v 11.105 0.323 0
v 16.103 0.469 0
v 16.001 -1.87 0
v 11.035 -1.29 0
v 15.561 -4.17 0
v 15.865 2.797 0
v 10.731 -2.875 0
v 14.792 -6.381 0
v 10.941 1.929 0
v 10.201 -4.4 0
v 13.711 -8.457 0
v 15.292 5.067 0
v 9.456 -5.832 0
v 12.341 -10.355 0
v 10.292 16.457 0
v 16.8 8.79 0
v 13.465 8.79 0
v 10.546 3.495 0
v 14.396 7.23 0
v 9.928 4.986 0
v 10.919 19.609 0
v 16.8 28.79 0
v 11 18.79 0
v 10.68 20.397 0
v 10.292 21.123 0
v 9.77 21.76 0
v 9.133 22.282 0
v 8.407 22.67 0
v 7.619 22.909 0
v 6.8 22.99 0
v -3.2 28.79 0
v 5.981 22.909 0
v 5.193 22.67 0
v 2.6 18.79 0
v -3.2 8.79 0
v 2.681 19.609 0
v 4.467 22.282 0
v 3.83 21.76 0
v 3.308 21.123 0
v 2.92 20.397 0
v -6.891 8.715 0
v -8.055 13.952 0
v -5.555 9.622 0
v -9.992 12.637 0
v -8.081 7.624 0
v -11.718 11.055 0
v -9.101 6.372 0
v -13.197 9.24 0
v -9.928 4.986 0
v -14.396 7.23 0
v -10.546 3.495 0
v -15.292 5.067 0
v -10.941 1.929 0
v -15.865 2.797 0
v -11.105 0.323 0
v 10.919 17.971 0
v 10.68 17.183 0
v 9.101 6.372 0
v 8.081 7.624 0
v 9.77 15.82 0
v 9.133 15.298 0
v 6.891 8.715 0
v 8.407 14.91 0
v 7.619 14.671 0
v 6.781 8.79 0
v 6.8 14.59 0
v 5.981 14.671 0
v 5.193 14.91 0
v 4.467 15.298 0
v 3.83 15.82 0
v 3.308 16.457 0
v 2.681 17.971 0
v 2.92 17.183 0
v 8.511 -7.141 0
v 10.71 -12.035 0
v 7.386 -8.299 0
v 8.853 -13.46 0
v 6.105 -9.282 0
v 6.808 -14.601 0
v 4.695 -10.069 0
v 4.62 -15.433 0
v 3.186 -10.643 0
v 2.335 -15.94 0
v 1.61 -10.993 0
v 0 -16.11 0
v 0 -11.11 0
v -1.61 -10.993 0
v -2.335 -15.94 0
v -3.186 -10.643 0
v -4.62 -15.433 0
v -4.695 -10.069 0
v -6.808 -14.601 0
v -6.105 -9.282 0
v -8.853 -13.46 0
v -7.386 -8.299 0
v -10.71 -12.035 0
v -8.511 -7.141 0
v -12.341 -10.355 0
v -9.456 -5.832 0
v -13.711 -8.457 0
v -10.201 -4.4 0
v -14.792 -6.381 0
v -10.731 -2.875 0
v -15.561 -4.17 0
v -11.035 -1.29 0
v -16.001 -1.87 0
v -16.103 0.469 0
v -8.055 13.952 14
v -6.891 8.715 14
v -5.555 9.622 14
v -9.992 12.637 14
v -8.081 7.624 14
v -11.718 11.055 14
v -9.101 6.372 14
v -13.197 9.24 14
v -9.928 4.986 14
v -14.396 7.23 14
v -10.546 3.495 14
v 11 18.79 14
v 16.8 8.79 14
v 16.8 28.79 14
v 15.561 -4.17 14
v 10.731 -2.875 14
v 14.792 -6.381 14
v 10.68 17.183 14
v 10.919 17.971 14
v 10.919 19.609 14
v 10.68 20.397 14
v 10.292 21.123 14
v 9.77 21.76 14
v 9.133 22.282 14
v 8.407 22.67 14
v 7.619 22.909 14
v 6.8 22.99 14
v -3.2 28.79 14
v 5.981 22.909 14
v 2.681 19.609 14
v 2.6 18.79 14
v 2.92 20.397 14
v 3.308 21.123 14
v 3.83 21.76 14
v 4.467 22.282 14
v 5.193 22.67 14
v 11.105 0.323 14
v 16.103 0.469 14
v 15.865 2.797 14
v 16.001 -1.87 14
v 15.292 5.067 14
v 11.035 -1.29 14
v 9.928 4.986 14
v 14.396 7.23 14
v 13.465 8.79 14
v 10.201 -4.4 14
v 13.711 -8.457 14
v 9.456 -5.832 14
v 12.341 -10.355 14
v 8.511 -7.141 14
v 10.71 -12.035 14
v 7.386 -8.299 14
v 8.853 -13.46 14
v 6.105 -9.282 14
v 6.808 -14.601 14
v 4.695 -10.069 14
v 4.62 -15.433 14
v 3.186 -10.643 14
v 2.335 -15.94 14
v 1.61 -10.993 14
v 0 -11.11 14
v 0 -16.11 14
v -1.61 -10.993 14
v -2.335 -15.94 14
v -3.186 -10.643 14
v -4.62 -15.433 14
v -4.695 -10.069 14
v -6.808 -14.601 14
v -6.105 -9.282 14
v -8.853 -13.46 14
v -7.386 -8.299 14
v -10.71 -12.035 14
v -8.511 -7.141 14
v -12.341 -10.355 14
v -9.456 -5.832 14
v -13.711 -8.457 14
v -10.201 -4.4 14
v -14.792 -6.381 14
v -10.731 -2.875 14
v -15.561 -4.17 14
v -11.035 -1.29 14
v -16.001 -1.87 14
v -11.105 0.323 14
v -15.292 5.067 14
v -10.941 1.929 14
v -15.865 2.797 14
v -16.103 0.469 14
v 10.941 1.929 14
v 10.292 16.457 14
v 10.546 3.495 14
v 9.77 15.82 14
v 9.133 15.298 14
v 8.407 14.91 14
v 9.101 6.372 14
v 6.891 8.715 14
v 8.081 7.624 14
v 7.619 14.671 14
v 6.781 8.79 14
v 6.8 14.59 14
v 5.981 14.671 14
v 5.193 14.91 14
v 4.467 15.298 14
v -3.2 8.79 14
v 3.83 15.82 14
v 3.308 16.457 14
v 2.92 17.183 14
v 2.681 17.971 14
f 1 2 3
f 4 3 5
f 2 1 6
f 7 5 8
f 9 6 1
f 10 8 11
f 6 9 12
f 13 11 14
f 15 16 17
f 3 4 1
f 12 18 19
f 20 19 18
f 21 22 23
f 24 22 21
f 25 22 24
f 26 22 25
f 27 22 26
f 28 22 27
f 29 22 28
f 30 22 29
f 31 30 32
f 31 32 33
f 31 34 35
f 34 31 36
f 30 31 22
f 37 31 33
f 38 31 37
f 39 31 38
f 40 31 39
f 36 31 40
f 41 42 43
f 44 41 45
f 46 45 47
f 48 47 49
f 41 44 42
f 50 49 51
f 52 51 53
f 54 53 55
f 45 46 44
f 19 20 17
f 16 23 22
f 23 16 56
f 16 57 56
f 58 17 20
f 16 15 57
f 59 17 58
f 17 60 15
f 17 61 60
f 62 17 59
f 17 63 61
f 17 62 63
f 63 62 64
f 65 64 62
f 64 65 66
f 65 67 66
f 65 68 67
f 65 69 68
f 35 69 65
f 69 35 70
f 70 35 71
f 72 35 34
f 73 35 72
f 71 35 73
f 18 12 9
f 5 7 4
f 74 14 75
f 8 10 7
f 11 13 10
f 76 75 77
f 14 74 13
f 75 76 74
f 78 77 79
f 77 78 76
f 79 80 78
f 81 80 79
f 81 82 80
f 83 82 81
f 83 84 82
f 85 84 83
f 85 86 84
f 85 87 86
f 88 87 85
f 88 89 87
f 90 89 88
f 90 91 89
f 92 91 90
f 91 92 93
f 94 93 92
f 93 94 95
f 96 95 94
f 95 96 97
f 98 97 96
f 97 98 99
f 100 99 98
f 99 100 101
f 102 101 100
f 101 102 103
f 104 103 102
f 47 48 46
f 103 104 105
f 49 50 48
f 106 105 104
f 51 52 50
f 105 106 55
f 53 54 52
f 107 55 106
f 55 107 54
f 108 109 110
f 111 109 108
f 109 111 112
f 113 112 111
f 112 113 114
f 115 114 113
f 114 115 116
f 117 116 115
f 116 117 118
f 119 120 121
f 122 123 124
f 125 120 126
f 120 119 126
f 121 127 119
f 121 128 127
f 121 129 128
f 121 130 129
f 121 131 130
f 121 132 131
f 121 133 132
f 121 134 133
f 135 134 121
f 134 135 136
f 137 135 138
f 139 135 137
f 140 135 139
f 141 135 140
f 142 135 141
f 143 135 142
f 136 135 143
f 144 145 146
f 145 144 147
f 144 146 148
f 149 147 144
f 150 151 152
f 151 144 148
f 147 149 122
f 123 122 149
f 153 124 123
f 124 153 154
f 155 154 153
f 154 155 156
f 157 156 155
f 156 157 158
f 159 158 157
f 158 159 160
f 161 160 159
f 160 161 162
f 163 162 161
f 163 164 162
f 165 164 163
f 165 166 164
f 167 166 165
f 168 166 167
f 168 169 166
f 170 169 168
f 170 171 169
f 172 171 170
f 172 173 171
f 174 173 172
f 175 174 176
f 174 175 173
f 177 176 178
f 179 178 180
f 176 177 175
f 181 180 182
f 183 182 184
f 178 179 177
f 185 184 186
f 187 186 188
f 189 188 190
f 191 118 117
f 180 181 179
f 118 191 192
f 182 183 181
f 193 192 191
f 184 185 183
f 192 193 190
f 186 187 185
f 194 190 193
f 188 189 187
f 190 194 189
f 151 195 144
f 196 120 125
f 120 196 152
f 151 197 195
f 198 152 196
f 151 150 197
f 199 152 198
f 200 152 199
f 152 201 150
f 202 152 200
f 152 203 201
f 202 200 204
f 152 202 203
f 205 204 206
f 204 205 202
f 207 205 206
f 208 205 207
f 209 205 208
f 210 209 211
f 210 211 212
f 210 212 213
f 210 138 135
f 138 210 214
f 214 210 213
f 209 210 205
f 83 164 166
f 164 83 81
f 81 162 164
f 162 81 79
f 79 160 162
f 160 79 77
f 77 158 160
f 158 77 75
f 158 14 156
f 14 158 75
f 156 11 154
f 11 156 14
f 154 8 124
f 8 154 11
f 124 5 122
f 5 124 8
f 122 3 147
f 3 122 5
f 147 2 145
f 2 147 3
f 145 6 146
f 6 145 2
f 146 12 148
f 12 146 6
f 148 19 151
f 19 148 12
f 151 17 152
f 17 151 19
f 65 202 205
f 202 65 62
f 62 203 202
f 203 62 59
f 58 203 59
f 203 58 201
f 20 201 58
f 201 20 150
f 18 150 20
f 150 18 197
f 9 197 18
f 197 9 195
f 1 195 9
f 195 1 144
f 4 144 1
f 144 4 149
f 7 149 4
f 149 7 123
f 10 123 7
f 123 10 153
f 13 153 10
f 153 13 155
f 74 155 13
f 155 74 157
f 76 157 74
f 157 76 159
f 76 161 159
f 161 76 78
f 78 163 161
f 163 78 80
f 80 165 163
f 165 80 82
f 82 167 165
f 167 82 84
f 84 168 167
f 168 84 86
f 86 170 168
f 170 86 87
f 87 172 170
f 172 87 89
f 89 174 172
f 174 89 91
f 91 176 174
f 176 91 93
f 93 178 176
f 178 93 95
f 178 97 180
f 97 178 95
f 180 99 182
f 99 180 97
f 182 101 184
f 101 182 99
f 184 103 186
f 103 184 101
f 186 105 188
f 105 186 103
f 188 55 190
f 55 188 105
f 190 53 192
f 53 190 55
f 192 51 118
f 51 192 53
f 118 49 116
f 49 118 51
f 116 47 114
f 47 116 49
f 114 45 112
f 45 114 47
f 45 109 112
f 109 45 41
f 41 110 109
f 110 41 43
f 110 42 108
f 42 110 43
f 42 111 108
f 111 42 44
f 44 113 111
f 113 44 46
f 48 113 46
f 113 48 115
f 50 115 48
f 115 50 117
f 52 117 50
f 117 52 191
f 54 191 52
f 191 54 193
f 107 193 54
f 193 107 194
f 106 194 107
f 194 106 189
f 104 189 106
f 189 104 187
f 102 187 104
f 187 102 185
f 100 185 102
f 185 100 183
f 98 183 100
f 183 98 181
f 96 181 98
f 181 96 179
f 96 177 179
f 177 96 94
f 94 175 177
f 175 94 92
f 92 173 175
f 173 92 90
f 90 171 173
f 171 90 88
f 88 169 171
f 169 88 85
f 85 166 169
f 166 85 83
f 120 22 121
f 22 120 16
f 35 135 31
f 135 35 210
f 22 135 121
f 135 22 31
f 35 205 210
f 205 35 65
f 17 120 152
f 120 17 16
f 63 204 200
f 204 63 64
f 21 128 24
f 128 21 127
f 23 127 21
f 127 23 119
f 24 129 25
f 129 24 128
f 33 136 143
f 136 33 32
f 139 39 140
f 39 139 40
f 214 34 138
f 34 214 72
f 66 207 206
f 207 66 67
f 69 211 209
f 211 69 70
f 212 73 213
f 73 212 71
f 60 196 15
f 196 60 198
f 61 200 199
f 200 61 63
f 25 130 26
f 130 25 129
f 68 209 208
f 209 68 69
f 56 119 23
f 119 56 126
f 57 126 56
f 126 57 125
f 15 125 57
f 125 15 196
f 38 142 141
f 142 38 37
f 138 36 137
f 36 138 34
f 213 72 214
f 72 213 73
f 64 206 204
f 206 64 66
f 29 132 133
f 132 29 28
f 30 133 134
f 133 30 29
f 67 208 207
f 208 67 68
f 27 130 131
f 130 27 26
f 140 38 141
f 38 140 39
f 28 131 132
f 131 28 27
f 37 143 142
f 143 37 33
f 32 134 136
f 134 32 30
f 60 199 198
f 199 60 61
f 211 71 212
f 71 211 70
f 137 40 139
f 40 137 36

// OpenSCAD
$fn = 32;

// ----------------------------------------------------------------------
// Pipe clamp: 32.22 mm ring, 5 mm wall, 14 mm wide
// ----------------------------------------------------------------------

// --- parameters (mm) ---
outer_r = 16.11;          // clamp outside radius
inner_r = 11.11;          // pipe bore radius
band = 5;                 // band thickness
clamp_w = 14;             // clamp width
opening = 60;             // opening angle between the ends
lug_w = 20;               // lug width
lug_len = 20;             // lug length
bolt_d = 8.4;             // bolt hole

clamp_profile = [[-8.055, 13.952], [-9.992, 12.637], [-11.718, 11.055], [-13.197, 9.24], [-14.396, 7.23], [-15.292, 5.067], [-15.865, 2.797], [-16.103, 0.469], [-16.001, -1.87], [-15.561, -4.17], [-14.792, -6.381], [-13.711, -8.457], [-12.341, -10.355], [-10.71, -12.035], [-8.853, -13.46], [-6.808, -14.601], [-4.62, -15.433], [-2.335, -15.94], [0, -16.11], [2.335, -15.94], [4.62, -15.433], [6.808, -14.601], [8.853, -13.46], [10.71, -12.035], [12.341, -10.355], [13.711, -8.457], [14.792, -6.381], [15.561, -4.17], [16.001, -1.87], [16.103, 0.469], [15.865, 2.797], [15.292, 5.067], [14.396, 7.23], [13.197, 9.24], [11.718, 11.055], [9.992, 12.637], [8.055, 13.952], [5.555, 9.622], [6.891, 8.715], [8.081, 7.624], [9.101, 6.372], [9.928, 4.986], [10.546, 3.495], [10.941, 1.929], [11.105, 0.323], [11.035, -1.29], [10.731, -2.875], [10.201, -4.4], [9.456, -5.832], [8.511, -7.141], [7.386, -8.299], [6.105, -9.282], [4.695, -10.069], [3.186, -10.643], [1.61, -10.993], [0, -11.11], [-1.61, -10.993], [-3.186, -10.643], [-4.695, -10.069], [-6.105, -9.282], [-7.386, -8.299], [-8.511, -7.141], [-9.456, -5.832], [-10.201, -4.4], [-10.731, -2.875], [-11.035, -1.29], [-11.105, 0.323], [-10.941, 1.929], [-10.546, 3.495], [-9.928, 4.986], [-9.101, 6.372], [-8.081, 7.624], [-6.891, 8.715], [-5.555, 9.622]];

difference() {
  union() {
    linear_extrude(height = clamp_w) polygon(clamp_profile);
    /* bolt lug on the other end */
    translate([-3.2, 8.79, 0]) cube([lug_w, 20, clamp_w]);
  }
  translate([6.8, 18.79, -2.5]) cylinder(h = clamp_w + 5, d = bolt_d);
}
